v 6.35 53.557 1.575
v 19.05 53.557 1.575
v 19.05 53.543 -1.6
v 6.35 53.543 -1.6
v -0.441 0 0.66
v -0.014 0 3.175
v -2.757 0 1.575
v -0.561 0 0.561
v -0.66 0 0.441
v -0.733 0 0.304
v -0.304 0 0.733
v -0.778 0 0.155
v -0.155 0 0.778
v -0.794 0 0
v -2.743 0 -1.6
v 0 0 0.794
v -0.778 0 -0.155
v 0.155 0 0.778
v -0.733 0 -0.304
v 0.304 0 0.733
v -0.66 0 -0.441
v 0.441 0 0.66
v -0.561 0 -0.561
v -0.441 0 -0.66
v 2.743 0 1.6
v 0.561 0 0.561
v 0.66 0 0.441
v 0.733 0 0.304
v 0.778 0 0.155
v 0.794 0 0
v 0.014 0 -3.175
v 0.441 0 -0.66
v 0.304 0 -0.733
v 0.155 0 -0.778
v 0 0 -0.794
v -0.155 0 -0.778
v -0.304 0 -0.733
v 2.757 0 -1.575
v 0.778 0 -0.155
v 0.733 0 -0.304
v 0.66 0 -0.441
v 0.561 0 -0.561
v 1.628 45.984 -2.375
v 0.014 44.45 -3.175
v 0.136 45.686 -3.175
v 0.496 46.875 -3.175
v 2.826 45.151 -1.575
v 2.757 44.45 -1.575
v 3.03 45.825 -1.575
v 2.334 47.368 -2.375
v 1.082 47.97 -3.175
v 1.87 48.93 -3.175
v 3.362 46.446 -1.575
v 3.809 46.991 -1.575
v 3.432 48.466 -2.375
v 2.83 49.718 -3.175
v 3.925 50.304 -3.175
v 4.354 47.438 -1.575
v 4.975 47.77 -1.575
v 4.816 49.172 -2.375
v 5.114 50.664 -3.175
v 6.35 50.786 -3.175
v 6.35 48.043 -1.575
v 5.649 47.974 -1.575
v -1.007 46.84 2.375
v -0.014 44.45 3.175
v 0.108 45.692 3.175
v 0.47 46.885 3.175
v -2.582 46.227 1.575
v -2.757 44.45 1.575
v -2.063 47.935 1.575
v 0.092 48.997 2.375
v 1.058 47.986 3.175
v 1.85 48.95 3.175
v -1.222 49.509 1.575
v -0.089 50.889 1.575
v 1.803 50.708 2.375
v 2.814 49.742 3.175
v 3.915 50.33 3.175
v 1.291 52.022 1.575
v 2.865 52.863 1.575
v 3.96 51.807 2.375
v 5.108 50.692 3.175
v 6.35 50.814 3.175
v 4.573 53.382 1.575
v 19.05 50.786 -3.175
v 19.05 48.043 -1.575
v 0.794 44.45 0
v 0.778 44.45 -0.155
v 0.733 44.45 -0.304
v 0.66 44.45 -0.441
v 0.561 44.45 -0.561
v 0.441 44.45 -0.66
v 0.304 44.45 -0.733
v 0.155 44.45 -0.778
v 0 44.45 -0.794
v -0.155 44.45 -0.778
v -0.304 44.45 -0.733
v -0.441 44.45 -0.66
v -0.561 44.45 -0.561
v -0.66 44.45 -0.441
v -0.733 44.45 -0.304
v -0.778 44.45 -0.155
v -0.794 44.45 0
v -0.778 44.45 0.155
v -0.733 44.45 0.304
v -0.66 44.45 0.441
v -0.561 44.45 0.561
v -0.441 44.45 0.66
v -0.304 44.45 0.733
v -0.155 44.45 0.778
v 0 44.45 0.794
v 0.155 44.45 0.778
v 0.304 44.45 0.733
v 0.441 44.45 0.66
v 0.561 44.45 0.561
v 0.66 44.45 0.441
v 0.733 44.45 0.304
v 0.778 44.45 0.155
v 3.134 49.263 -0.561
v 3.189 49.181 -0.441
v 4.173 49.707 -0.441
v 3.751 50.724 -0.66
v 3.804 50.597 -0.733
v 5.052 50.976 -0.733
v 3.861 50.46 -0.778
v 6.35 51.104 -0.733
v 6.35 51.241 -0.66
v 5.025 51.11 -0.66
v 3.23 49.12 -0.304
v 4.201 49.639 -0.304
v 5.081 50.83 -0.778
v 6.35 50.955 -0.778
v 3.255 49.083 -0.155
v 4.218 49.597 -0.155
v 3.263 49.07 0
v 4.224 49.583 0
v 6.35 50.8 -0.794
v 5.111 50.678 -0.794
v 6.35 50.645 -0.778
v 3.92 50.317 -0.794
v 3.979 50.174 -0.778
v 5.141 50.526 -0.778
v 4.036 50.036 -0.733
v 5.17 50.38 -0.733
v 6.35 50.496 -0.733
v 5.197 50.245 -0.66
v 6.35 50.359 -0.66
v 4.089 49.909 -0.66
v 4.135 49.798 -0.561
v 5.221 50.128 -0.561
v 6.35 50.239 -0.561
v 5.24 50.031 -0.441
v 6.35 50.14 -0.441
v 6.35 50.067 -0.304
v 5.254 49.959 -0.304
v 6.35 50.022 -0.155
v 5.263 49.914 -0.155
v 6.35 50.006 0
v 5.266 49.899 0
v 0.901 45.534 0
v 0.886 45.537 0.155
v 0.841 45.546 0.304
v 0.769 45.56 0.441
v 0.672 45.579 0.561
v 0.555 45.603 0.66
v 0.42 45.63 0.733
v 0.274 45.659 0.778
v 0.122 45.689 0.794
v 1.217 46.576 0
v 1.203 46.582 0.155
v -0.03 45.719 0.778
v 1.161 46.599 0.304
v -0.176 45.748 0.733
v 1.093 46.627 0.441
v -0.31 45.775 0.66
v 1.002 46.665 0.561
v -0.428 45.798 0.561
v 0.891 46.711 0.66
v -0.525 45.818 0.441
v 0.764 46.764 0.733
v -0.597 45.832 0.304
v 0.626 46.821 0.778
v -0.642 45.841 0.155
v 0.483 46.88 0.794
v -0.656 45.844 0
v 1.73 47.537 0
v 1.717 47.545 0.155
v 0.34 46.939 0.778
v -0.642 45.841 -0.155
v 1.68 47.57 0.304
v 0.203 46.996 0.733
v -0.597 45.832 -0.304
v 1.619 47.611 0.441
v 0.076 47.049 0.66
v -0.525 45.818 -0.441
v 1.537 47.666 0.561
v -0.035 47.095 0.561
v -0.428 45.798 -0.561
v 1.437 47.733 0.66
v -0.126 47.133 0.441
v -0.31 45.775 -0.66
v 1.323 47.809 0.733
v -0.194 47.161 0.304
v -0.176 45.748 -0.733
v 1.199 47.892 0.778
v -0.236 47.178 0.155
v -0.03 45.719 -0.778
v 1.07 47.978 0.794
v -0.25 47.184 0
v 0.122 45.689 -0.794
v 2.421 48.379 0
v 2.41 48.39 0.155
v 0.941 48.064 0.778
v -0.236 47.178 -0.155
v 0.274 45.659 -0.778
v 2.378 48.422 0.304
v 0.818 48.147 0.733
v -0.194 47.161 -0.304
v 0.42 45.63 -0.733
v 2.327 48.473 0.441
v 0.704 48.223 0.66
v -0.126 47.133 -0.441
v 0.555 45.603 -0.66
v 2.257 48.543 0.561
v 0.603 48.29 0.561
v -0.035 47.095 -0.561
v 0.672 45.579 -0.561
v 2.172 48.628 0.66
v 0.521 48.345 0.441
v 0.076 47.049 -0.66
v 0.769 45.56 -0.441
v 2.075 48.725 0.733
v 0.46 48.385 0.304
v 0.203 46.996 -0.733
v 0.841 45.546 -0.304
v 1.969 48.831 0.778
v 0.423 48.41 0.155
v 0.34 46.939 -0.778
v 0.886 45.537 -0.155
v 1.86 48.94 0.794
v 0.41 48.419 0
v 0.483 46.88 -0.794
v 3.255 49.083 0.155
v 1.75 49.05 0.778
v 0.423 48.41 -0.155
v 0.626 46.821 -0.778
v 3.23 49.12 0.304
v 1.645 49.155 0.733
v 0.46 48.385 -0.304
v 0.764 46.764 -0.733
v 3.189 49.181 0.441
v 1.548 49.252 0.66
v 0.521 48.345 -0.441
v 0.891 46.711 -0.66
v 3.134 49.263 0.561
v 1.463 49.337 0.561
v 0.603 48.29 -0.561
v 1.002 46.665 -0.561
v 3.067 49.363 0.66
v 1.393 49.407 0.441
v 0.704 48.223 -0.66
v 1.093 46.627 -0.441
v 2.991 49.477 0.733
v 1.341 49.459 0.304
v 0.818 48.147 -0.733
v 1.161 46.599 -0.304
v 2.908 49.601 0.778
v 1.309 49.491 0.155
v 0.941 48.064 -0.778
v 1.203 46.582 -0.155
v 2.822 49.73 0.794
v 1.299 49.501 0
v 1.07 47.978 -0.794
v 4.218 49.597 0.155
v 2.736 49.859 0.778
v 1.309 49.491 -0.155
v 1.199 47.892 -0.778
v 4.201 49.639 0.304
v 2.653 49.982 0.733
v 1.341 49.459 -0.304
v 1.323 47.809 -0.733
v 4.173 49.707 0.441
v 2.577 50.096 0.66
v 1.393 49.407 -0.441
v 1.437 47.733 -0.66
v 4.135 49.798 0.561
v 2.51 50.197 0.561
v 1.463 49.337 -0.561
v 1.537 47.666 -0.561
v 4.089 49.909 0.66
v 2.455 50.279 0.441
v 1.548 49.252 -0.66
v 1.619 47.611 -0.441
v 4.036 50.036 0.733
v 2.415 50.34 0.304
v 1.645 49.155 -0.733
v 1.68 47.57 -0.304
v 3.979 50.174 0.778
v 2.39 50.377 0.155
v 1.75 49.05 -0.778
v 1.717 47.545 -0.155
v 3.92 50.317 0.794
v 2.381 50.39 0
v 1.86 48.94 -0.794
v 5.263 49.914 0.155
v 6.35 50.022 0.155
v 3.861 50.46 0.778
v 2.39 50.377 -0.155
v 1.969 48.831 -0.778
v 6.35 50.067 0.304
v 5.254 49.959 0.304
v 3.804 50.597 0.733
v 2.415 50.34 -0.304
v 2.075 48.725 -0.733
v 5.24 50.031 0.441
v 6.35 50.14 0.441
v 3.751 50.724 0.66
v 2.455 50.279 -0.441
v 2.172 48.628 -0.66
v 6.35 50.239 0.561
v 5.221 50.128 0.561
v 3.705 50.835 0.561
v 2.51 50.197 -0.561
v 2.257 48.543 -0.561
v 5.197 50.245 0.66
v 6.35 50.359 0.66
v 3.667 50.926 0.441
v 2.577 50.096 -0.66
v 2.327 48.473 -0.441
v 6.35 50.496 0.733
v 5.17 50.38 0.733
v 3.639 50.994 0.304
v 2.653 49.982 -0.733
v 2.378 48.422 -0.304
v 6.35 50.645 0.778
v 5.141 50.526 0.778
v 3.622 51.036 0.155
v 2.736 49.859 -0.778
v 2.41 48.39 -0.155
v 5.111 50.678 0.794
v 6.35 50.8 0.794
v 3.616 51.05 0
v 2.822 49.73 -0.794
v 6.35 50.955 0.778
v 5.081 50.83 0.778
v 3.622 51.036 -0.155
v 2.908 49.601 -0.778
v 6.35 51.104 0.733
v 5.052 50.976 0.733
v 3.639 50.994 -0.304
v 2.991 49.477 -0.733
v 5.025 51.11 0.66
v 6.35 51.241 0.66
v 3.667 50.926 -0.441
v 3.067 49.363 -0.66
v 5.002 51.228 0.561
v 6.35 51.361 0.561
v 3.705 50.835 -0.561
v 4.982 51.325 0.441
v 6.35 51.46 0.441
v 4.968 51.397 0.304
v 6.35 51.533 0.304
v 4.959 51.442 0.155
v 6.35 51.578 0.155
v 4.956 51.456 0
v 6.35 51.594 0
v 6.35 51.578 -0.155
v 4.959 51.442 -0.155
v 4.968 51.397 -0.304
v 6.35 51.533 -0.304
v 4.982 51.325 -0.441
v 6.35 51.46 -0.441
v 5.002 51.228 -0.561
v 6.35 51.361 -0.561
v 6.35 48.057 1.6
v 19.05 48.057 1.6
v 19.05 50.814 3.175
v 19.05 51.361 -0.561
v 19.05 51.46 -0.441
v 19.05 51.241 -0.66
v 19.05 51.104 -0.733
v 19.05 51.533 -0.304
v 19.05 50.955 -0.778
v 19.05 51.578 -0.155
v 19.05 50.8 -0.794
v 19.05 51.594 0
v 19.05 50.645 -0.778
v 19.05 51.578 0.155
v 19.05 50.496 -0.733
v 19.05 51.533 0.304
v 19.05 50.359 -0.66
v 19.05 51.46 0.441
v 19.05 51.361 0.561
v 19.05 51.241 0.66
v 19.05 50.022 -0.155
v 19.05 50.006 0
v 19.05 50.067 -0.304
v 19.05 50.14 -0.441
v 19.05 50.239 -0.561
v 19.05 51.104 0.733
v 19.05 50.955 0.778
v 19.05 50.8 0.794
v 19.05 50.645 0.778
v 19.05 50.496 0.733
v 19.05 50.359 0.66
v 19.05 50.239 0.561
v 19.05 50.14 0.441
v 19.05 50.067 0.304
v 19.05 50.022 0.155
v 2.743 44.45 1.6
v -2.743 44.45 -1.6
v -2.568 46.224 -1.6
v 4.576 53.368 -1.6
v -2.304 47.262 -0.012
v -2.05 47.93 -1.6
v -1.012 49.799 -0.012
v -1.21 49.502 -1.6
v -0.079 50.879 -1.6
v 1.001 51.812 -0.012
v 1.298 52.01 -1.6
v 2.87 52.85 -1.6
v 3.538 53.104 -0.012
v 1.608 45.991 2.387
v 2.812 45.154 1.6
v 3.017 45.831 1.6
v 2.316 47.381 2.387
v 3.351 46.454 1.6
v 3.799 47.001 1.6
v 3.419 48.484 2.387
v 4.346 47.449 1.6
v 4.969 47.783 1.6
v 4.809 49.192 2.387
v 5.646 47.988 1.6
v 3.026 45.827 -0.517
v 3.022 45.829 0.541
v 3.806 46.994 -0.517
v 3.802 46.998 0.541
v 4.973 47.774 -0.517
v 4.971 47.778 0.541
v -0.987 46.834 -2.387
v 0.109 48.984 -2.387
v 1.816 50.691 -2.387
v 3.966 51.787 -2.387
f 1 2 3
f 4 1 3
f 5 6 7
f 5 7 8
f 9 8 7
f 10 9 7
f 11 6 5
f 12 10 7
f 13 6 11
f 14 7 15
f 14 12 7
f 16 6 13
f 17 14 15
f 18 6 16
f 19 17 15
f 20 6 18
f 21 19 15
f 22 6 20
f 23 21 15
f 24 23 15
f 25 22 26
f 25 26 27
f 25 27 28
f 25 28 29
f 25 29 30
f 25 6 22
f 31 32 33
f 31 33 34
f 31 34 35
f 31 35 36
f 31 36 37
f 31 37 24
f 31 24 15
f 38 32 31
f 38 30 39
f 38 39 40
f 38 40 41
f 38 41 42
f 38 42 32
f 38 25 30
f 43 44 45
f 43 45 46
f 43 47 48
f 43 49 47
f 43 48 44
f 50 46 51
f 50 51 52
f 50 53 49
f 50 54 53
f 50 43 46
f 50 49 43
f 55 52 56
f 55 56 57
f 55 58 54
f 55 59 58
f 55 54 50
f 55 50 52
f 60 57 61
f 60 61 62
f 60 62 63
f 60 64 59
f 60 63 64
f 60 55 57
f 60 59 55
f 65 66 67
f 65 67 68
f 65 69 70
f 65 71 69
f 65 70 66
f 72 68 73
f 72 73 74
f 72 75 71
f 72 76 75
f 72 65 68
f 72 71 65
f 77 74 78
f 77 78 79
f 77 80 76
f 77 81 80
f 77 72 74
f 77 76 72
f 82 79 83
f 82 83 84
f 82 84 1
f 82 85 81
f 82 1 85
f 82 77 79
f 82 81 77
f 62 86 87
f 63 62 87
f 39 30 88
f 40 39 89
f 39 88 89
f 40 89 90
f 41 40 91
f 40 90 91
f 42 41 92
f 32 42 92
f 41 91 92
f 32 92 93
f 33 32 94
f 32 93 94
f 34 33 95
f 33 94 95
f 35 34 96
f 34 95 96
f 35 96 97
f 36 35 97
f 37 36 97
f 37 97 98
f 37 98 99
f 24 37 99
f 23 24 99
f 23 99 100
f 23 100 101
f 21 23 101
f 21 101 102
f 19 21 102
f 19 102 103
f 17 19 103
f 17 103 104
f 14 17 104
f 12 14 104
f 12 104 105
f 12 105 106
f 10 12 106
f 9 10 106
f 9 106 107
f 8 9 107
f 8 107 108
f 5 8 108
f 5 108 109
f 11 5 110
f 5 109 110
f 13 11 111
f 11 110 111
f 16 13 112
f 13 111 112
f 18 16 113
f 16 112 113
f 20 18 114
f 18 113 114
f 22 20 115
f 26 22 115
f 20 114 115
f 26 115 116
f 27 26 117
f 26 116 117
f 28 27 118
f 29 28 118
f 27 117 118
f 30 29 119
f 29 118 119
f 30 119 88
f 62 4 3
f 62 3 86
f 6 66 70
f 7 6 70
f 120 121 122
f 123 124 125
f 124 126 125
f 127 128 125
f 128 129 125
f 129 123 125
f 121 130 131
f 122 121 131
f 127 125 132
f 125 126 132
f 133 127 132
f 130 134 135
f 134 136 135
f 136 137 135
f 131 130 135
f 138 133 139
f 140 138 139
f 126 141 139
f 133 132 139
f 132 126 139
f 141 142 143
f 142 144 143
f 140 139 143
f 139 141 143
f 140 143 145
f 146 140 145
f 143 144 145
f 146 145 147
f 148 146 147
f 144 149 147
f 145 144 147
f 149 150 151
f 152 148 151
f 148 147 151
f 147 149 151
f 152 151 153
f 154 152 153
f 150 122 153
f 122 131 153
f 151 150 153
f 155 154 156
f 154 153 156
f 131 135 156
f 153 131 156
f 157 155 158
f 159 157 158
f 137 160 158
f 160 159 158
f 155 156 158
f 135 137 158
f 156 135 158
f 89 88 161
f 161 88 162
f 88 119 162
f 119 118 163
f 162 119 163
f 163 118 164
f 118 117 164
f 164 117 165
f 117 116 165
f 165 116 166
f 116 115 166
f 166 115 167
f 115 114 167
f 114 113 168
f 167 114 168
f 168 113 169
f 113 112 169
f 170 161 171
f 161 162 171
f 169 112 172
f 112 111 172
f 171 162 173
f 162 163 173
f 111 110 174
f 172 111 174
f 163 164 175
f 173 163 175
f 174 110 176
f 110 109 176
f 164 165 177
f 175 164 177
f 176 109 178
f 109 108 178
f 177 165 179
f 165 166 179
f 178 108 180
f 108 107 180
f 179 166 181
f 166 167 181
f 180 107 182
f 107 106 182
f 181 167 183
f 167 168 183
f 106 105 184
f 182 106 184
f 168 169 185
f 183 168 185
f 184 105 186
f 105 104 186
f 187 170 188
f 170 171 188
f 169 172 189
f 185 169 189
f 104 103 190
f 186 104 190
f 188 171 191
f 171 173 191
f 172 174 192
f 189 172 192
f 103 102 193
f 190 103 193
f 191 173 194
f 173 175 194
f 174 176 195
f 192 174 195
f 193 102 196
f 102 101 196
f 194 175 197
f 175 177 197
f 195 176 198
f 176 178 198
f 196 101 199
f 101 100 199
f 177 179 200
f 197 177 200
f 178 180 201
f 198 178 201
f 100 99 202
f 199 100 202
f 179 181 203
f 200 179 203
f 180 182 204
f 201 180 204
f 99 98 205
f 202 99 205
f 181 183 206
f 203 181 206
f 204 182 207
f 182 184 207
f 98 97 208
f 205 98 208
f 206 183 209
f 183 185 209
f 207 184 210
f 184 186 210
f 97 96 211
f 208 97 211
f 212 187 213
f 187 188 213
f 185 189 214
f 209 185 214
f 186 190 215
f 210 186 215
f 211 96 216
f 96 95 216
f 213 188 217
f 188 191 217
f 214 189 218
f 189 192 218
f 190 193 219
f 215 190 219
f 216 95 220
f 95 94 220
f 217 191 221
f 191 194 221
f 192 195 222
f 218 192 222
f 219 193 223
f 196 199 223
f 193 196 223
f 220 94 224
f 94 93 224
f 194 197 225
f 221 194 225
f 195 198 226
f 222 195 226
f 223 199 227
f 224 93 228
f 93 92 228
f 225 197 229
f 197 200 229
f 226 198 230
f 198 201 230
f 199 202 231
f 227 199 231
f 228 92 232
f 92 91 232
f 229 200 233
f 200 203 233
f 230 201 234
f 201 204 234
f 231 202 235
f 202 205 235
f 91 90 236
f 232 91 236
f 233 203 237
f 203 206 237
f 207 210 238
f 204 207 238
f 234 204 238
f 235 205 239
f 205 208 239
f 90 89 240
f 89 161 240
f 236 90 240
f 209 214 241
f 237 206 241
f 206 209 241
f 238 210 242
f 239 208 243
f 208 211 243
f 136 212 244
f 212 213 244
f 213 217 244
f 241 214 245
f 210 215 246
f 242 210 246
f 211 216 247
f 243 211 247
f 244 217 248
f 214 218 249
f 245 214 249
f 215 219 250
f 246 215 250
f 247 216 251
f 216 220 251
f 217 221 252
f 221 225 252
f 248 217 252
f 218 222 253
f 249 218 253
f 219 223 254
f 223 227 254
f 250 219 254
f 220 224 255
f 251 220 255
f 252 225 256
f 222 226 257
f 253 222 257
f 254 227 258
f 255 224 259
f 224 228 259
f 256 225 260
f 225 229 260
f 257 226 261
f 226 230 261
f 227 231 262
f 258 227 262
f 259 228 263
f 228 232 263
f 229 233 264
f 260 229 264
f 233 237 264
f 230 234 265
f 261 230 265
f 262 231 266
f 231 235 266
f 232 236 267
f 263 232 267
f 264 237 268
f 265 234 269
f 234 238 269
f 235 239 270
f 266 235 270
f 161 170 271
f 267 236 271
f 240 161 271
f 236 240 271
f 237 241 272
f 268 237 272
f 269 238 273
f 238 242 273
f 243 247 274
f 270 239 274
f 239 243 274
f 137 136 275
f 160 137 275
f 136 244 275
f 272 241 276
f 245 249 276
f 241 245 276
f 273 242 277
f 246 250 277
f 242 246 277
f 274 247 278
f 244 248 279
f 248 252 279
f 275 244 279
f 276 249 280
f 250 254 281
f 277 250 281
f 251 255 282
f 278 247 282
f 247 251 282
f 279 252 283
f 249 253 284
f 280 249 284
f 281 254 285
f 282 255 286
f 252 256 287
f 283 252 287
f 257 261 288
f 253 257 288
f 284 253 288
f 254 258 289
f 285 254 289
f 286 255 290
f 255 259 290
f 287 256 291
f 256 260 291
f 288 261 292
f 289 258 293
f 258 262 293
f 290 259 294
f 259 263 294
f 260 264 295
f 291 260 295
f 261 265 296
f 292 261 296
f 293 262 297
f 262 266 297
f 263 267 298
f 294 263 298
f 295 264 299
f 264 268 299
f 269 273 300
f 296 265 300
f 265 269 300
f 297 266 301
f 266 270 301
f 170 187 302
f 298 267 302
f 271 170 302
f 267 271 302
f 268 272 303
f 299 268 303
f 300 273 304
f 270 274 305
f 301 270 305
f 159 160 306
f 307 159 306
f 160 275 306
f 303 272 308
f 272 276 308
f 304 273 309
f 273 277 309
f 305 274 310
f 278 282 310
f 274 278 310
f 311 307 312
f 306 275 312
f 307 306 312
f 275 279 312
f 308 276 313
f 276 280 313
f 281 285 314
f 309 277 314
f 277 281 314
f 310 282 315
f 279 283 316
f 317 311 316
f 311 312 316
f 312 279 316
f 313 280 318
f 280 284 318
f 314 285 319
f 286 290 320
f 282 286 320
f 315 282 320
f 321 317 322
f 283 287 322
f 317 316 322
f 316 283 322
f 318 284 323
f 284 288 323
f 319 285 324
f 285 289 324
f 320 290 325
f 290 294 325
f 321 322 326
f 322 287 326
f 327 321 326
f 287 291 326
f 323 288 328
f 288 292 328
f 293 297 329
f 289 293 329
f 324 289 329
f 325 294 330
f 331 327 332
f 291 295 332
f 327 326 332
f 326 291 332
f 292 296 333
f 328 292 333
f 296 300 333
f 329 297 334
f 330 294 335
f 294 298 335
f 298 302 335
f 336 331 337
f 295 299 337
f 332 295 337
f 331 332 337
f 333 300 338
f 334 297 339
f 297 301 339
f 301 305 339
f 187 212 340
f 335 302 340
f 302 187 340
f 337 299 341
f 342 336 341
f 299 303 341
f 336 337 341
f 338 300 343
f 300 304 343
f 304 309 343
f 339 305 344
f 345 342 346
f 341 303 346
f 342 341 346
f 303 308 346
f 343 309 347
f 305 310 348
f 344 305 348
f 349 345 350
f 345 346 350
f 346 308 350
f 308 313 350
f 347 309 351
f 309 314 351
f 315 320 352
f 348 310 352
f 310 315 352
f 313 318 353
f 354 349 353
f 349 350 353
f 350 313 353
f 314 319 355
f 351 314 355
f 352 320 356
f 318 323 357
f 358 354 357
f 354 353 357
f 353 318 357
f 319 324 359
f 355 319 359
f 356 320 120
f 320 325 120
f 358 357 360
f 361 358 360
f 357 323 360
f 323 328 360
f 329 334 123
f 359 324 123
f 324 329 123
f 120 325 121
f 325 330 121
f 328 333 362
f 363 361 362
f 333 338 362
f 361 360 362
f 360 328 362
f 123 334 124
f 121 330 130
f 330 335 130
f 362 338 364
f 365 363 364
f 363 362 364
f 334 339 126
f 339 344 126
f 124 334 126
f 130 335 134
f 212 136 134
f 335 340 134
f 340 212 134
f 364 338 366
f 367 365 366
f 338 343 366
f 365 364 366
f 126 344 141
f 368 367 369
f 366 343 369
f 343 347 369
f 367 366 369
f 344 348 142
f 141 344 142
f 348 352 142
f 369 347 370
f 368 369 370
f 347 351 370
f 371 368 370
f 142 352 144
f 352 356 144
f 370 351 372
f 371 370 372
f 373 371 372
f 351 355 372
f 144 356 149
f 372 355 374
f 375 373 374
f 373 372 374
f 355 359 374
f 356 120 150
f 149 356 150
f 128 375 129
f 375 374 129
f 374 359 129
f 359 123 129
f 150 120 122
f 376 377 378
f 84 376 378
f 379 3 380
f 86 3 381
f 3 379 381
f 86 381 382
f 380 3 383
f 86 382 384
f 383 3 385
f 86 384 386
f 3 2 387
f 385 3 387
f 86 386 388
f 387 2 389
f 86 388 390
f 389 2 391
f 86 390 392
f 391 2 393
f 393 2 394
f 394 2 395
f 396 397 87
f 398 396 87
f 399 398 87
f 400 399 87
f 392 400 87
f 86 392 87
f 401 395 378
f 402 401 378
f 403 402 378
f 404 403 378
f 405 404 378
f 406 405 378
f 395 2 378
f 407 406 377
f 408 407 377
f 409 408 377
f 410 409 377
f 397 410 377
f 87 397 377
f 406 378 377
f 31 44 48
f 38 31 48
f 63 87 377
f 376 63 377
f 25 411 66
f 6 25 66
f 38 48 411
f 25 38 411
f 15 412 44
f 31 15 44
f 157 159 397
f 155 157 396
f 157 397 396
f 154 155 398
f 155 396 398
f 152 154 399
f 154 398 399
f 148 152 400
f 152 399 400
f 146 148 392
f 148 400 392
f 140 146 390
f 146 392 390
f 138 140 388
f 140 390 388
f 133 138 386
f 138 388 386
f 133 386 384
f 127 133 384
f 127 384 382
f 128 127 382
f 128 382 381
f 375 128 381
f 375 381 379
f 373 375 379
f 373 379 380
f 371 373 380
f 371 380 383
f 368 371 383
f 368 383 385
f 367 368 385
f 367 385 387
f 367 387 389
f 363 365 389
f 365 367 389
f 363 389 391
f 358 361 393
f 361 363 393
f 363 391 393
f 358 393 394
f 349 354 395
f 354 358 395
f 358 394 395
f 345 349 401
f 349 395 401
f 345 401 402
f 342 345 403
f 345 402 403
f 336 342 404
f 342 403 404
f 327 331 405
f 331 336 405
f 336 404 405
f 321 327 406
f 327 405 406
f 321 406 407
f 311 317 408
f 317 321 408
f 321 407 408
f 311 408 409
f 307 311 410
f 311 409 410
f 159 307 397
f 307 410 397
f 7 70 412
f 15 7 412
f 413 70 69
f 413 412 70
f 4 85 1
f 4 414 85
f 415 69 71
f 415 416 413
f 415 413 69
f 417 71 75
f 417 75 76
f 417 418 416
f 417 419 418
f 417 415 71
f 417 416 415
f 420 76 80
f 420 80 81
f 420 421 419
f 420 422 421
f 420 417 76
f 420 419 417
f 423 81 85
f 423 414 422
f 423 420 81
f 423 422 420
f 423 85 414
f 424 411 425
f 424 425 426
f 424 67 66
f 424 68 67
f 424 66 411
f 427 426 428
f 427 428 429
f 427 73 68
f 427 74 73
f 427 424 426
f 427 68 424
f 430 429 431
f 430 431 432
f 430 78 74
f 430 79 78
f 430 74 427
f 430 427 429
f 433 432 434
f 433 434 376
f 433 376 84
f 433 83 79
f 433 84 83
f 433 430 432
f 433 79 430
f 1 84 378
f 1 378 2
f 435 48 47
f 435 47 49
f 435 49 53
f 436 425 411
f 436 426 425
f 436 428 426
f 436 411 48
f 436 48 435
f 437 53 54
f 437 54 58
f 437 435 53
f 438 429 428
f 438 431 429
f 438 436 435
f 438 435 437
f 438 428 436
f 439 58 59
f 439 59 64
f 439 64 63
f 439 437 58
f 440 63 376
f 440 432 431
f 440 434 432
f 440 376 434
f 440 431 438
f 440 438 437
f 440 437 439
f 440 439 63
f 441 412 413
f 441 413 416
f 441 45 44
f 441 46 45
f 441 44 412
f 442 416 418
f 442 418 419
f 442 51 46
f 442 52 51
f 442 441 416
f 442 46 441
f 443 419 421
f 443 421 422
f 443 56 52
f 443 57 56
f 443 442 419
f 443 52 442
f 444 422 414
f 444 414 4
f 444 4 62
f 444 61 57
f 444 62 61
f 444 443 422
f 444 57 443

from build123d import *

# Parameters (mm, degrees)
F3_R = 0.79375


with BuildPart() as f2:
    # F2: sweep along a path in F1
    with BuildLine(Plane.XY) as f2_path:
        Line((0, 0), (0, 44.45))
        ThreePointArc((0, 44.45), (1.8598719395, 48.9401280605), (6.35, 50.8))
        Line((6.35, 50.8), (19.05, 50.8))
    # F0 (on Front) → F2 (sweep)
    with BuildSketch(Plane.XZ):
        Polygon((0.0141373198, -3.175), (2.7566993169, -1.5752567219), (2.7425619971, 1.5997432781), (-0.0141373198, 3.175), (-2.7566993169, 1.5752567219), (-2.7425619971, -1.5997432781), align=None)
    sweep(path=f2_path.line)

    # F4: sweep along a path in F1
    with BuildLine(Plane.XY) as f4_path:
        Line((0, 0), (0, 44.45))
        ThreePointArc((0, 44.45), (1.8598719395, 48.9401280605), (6.35, 50.8))
        Line((6.35, 50.8), (19.05, 50.8))
    # F3 (on Front) → F4 (sweep, cut)
    with BuildSketch(Plane.XZ):
        Circle(F3_R)
    sweep(path=f4_path.line, mode=Mode.SUBTRACT)


solid = f2.part
